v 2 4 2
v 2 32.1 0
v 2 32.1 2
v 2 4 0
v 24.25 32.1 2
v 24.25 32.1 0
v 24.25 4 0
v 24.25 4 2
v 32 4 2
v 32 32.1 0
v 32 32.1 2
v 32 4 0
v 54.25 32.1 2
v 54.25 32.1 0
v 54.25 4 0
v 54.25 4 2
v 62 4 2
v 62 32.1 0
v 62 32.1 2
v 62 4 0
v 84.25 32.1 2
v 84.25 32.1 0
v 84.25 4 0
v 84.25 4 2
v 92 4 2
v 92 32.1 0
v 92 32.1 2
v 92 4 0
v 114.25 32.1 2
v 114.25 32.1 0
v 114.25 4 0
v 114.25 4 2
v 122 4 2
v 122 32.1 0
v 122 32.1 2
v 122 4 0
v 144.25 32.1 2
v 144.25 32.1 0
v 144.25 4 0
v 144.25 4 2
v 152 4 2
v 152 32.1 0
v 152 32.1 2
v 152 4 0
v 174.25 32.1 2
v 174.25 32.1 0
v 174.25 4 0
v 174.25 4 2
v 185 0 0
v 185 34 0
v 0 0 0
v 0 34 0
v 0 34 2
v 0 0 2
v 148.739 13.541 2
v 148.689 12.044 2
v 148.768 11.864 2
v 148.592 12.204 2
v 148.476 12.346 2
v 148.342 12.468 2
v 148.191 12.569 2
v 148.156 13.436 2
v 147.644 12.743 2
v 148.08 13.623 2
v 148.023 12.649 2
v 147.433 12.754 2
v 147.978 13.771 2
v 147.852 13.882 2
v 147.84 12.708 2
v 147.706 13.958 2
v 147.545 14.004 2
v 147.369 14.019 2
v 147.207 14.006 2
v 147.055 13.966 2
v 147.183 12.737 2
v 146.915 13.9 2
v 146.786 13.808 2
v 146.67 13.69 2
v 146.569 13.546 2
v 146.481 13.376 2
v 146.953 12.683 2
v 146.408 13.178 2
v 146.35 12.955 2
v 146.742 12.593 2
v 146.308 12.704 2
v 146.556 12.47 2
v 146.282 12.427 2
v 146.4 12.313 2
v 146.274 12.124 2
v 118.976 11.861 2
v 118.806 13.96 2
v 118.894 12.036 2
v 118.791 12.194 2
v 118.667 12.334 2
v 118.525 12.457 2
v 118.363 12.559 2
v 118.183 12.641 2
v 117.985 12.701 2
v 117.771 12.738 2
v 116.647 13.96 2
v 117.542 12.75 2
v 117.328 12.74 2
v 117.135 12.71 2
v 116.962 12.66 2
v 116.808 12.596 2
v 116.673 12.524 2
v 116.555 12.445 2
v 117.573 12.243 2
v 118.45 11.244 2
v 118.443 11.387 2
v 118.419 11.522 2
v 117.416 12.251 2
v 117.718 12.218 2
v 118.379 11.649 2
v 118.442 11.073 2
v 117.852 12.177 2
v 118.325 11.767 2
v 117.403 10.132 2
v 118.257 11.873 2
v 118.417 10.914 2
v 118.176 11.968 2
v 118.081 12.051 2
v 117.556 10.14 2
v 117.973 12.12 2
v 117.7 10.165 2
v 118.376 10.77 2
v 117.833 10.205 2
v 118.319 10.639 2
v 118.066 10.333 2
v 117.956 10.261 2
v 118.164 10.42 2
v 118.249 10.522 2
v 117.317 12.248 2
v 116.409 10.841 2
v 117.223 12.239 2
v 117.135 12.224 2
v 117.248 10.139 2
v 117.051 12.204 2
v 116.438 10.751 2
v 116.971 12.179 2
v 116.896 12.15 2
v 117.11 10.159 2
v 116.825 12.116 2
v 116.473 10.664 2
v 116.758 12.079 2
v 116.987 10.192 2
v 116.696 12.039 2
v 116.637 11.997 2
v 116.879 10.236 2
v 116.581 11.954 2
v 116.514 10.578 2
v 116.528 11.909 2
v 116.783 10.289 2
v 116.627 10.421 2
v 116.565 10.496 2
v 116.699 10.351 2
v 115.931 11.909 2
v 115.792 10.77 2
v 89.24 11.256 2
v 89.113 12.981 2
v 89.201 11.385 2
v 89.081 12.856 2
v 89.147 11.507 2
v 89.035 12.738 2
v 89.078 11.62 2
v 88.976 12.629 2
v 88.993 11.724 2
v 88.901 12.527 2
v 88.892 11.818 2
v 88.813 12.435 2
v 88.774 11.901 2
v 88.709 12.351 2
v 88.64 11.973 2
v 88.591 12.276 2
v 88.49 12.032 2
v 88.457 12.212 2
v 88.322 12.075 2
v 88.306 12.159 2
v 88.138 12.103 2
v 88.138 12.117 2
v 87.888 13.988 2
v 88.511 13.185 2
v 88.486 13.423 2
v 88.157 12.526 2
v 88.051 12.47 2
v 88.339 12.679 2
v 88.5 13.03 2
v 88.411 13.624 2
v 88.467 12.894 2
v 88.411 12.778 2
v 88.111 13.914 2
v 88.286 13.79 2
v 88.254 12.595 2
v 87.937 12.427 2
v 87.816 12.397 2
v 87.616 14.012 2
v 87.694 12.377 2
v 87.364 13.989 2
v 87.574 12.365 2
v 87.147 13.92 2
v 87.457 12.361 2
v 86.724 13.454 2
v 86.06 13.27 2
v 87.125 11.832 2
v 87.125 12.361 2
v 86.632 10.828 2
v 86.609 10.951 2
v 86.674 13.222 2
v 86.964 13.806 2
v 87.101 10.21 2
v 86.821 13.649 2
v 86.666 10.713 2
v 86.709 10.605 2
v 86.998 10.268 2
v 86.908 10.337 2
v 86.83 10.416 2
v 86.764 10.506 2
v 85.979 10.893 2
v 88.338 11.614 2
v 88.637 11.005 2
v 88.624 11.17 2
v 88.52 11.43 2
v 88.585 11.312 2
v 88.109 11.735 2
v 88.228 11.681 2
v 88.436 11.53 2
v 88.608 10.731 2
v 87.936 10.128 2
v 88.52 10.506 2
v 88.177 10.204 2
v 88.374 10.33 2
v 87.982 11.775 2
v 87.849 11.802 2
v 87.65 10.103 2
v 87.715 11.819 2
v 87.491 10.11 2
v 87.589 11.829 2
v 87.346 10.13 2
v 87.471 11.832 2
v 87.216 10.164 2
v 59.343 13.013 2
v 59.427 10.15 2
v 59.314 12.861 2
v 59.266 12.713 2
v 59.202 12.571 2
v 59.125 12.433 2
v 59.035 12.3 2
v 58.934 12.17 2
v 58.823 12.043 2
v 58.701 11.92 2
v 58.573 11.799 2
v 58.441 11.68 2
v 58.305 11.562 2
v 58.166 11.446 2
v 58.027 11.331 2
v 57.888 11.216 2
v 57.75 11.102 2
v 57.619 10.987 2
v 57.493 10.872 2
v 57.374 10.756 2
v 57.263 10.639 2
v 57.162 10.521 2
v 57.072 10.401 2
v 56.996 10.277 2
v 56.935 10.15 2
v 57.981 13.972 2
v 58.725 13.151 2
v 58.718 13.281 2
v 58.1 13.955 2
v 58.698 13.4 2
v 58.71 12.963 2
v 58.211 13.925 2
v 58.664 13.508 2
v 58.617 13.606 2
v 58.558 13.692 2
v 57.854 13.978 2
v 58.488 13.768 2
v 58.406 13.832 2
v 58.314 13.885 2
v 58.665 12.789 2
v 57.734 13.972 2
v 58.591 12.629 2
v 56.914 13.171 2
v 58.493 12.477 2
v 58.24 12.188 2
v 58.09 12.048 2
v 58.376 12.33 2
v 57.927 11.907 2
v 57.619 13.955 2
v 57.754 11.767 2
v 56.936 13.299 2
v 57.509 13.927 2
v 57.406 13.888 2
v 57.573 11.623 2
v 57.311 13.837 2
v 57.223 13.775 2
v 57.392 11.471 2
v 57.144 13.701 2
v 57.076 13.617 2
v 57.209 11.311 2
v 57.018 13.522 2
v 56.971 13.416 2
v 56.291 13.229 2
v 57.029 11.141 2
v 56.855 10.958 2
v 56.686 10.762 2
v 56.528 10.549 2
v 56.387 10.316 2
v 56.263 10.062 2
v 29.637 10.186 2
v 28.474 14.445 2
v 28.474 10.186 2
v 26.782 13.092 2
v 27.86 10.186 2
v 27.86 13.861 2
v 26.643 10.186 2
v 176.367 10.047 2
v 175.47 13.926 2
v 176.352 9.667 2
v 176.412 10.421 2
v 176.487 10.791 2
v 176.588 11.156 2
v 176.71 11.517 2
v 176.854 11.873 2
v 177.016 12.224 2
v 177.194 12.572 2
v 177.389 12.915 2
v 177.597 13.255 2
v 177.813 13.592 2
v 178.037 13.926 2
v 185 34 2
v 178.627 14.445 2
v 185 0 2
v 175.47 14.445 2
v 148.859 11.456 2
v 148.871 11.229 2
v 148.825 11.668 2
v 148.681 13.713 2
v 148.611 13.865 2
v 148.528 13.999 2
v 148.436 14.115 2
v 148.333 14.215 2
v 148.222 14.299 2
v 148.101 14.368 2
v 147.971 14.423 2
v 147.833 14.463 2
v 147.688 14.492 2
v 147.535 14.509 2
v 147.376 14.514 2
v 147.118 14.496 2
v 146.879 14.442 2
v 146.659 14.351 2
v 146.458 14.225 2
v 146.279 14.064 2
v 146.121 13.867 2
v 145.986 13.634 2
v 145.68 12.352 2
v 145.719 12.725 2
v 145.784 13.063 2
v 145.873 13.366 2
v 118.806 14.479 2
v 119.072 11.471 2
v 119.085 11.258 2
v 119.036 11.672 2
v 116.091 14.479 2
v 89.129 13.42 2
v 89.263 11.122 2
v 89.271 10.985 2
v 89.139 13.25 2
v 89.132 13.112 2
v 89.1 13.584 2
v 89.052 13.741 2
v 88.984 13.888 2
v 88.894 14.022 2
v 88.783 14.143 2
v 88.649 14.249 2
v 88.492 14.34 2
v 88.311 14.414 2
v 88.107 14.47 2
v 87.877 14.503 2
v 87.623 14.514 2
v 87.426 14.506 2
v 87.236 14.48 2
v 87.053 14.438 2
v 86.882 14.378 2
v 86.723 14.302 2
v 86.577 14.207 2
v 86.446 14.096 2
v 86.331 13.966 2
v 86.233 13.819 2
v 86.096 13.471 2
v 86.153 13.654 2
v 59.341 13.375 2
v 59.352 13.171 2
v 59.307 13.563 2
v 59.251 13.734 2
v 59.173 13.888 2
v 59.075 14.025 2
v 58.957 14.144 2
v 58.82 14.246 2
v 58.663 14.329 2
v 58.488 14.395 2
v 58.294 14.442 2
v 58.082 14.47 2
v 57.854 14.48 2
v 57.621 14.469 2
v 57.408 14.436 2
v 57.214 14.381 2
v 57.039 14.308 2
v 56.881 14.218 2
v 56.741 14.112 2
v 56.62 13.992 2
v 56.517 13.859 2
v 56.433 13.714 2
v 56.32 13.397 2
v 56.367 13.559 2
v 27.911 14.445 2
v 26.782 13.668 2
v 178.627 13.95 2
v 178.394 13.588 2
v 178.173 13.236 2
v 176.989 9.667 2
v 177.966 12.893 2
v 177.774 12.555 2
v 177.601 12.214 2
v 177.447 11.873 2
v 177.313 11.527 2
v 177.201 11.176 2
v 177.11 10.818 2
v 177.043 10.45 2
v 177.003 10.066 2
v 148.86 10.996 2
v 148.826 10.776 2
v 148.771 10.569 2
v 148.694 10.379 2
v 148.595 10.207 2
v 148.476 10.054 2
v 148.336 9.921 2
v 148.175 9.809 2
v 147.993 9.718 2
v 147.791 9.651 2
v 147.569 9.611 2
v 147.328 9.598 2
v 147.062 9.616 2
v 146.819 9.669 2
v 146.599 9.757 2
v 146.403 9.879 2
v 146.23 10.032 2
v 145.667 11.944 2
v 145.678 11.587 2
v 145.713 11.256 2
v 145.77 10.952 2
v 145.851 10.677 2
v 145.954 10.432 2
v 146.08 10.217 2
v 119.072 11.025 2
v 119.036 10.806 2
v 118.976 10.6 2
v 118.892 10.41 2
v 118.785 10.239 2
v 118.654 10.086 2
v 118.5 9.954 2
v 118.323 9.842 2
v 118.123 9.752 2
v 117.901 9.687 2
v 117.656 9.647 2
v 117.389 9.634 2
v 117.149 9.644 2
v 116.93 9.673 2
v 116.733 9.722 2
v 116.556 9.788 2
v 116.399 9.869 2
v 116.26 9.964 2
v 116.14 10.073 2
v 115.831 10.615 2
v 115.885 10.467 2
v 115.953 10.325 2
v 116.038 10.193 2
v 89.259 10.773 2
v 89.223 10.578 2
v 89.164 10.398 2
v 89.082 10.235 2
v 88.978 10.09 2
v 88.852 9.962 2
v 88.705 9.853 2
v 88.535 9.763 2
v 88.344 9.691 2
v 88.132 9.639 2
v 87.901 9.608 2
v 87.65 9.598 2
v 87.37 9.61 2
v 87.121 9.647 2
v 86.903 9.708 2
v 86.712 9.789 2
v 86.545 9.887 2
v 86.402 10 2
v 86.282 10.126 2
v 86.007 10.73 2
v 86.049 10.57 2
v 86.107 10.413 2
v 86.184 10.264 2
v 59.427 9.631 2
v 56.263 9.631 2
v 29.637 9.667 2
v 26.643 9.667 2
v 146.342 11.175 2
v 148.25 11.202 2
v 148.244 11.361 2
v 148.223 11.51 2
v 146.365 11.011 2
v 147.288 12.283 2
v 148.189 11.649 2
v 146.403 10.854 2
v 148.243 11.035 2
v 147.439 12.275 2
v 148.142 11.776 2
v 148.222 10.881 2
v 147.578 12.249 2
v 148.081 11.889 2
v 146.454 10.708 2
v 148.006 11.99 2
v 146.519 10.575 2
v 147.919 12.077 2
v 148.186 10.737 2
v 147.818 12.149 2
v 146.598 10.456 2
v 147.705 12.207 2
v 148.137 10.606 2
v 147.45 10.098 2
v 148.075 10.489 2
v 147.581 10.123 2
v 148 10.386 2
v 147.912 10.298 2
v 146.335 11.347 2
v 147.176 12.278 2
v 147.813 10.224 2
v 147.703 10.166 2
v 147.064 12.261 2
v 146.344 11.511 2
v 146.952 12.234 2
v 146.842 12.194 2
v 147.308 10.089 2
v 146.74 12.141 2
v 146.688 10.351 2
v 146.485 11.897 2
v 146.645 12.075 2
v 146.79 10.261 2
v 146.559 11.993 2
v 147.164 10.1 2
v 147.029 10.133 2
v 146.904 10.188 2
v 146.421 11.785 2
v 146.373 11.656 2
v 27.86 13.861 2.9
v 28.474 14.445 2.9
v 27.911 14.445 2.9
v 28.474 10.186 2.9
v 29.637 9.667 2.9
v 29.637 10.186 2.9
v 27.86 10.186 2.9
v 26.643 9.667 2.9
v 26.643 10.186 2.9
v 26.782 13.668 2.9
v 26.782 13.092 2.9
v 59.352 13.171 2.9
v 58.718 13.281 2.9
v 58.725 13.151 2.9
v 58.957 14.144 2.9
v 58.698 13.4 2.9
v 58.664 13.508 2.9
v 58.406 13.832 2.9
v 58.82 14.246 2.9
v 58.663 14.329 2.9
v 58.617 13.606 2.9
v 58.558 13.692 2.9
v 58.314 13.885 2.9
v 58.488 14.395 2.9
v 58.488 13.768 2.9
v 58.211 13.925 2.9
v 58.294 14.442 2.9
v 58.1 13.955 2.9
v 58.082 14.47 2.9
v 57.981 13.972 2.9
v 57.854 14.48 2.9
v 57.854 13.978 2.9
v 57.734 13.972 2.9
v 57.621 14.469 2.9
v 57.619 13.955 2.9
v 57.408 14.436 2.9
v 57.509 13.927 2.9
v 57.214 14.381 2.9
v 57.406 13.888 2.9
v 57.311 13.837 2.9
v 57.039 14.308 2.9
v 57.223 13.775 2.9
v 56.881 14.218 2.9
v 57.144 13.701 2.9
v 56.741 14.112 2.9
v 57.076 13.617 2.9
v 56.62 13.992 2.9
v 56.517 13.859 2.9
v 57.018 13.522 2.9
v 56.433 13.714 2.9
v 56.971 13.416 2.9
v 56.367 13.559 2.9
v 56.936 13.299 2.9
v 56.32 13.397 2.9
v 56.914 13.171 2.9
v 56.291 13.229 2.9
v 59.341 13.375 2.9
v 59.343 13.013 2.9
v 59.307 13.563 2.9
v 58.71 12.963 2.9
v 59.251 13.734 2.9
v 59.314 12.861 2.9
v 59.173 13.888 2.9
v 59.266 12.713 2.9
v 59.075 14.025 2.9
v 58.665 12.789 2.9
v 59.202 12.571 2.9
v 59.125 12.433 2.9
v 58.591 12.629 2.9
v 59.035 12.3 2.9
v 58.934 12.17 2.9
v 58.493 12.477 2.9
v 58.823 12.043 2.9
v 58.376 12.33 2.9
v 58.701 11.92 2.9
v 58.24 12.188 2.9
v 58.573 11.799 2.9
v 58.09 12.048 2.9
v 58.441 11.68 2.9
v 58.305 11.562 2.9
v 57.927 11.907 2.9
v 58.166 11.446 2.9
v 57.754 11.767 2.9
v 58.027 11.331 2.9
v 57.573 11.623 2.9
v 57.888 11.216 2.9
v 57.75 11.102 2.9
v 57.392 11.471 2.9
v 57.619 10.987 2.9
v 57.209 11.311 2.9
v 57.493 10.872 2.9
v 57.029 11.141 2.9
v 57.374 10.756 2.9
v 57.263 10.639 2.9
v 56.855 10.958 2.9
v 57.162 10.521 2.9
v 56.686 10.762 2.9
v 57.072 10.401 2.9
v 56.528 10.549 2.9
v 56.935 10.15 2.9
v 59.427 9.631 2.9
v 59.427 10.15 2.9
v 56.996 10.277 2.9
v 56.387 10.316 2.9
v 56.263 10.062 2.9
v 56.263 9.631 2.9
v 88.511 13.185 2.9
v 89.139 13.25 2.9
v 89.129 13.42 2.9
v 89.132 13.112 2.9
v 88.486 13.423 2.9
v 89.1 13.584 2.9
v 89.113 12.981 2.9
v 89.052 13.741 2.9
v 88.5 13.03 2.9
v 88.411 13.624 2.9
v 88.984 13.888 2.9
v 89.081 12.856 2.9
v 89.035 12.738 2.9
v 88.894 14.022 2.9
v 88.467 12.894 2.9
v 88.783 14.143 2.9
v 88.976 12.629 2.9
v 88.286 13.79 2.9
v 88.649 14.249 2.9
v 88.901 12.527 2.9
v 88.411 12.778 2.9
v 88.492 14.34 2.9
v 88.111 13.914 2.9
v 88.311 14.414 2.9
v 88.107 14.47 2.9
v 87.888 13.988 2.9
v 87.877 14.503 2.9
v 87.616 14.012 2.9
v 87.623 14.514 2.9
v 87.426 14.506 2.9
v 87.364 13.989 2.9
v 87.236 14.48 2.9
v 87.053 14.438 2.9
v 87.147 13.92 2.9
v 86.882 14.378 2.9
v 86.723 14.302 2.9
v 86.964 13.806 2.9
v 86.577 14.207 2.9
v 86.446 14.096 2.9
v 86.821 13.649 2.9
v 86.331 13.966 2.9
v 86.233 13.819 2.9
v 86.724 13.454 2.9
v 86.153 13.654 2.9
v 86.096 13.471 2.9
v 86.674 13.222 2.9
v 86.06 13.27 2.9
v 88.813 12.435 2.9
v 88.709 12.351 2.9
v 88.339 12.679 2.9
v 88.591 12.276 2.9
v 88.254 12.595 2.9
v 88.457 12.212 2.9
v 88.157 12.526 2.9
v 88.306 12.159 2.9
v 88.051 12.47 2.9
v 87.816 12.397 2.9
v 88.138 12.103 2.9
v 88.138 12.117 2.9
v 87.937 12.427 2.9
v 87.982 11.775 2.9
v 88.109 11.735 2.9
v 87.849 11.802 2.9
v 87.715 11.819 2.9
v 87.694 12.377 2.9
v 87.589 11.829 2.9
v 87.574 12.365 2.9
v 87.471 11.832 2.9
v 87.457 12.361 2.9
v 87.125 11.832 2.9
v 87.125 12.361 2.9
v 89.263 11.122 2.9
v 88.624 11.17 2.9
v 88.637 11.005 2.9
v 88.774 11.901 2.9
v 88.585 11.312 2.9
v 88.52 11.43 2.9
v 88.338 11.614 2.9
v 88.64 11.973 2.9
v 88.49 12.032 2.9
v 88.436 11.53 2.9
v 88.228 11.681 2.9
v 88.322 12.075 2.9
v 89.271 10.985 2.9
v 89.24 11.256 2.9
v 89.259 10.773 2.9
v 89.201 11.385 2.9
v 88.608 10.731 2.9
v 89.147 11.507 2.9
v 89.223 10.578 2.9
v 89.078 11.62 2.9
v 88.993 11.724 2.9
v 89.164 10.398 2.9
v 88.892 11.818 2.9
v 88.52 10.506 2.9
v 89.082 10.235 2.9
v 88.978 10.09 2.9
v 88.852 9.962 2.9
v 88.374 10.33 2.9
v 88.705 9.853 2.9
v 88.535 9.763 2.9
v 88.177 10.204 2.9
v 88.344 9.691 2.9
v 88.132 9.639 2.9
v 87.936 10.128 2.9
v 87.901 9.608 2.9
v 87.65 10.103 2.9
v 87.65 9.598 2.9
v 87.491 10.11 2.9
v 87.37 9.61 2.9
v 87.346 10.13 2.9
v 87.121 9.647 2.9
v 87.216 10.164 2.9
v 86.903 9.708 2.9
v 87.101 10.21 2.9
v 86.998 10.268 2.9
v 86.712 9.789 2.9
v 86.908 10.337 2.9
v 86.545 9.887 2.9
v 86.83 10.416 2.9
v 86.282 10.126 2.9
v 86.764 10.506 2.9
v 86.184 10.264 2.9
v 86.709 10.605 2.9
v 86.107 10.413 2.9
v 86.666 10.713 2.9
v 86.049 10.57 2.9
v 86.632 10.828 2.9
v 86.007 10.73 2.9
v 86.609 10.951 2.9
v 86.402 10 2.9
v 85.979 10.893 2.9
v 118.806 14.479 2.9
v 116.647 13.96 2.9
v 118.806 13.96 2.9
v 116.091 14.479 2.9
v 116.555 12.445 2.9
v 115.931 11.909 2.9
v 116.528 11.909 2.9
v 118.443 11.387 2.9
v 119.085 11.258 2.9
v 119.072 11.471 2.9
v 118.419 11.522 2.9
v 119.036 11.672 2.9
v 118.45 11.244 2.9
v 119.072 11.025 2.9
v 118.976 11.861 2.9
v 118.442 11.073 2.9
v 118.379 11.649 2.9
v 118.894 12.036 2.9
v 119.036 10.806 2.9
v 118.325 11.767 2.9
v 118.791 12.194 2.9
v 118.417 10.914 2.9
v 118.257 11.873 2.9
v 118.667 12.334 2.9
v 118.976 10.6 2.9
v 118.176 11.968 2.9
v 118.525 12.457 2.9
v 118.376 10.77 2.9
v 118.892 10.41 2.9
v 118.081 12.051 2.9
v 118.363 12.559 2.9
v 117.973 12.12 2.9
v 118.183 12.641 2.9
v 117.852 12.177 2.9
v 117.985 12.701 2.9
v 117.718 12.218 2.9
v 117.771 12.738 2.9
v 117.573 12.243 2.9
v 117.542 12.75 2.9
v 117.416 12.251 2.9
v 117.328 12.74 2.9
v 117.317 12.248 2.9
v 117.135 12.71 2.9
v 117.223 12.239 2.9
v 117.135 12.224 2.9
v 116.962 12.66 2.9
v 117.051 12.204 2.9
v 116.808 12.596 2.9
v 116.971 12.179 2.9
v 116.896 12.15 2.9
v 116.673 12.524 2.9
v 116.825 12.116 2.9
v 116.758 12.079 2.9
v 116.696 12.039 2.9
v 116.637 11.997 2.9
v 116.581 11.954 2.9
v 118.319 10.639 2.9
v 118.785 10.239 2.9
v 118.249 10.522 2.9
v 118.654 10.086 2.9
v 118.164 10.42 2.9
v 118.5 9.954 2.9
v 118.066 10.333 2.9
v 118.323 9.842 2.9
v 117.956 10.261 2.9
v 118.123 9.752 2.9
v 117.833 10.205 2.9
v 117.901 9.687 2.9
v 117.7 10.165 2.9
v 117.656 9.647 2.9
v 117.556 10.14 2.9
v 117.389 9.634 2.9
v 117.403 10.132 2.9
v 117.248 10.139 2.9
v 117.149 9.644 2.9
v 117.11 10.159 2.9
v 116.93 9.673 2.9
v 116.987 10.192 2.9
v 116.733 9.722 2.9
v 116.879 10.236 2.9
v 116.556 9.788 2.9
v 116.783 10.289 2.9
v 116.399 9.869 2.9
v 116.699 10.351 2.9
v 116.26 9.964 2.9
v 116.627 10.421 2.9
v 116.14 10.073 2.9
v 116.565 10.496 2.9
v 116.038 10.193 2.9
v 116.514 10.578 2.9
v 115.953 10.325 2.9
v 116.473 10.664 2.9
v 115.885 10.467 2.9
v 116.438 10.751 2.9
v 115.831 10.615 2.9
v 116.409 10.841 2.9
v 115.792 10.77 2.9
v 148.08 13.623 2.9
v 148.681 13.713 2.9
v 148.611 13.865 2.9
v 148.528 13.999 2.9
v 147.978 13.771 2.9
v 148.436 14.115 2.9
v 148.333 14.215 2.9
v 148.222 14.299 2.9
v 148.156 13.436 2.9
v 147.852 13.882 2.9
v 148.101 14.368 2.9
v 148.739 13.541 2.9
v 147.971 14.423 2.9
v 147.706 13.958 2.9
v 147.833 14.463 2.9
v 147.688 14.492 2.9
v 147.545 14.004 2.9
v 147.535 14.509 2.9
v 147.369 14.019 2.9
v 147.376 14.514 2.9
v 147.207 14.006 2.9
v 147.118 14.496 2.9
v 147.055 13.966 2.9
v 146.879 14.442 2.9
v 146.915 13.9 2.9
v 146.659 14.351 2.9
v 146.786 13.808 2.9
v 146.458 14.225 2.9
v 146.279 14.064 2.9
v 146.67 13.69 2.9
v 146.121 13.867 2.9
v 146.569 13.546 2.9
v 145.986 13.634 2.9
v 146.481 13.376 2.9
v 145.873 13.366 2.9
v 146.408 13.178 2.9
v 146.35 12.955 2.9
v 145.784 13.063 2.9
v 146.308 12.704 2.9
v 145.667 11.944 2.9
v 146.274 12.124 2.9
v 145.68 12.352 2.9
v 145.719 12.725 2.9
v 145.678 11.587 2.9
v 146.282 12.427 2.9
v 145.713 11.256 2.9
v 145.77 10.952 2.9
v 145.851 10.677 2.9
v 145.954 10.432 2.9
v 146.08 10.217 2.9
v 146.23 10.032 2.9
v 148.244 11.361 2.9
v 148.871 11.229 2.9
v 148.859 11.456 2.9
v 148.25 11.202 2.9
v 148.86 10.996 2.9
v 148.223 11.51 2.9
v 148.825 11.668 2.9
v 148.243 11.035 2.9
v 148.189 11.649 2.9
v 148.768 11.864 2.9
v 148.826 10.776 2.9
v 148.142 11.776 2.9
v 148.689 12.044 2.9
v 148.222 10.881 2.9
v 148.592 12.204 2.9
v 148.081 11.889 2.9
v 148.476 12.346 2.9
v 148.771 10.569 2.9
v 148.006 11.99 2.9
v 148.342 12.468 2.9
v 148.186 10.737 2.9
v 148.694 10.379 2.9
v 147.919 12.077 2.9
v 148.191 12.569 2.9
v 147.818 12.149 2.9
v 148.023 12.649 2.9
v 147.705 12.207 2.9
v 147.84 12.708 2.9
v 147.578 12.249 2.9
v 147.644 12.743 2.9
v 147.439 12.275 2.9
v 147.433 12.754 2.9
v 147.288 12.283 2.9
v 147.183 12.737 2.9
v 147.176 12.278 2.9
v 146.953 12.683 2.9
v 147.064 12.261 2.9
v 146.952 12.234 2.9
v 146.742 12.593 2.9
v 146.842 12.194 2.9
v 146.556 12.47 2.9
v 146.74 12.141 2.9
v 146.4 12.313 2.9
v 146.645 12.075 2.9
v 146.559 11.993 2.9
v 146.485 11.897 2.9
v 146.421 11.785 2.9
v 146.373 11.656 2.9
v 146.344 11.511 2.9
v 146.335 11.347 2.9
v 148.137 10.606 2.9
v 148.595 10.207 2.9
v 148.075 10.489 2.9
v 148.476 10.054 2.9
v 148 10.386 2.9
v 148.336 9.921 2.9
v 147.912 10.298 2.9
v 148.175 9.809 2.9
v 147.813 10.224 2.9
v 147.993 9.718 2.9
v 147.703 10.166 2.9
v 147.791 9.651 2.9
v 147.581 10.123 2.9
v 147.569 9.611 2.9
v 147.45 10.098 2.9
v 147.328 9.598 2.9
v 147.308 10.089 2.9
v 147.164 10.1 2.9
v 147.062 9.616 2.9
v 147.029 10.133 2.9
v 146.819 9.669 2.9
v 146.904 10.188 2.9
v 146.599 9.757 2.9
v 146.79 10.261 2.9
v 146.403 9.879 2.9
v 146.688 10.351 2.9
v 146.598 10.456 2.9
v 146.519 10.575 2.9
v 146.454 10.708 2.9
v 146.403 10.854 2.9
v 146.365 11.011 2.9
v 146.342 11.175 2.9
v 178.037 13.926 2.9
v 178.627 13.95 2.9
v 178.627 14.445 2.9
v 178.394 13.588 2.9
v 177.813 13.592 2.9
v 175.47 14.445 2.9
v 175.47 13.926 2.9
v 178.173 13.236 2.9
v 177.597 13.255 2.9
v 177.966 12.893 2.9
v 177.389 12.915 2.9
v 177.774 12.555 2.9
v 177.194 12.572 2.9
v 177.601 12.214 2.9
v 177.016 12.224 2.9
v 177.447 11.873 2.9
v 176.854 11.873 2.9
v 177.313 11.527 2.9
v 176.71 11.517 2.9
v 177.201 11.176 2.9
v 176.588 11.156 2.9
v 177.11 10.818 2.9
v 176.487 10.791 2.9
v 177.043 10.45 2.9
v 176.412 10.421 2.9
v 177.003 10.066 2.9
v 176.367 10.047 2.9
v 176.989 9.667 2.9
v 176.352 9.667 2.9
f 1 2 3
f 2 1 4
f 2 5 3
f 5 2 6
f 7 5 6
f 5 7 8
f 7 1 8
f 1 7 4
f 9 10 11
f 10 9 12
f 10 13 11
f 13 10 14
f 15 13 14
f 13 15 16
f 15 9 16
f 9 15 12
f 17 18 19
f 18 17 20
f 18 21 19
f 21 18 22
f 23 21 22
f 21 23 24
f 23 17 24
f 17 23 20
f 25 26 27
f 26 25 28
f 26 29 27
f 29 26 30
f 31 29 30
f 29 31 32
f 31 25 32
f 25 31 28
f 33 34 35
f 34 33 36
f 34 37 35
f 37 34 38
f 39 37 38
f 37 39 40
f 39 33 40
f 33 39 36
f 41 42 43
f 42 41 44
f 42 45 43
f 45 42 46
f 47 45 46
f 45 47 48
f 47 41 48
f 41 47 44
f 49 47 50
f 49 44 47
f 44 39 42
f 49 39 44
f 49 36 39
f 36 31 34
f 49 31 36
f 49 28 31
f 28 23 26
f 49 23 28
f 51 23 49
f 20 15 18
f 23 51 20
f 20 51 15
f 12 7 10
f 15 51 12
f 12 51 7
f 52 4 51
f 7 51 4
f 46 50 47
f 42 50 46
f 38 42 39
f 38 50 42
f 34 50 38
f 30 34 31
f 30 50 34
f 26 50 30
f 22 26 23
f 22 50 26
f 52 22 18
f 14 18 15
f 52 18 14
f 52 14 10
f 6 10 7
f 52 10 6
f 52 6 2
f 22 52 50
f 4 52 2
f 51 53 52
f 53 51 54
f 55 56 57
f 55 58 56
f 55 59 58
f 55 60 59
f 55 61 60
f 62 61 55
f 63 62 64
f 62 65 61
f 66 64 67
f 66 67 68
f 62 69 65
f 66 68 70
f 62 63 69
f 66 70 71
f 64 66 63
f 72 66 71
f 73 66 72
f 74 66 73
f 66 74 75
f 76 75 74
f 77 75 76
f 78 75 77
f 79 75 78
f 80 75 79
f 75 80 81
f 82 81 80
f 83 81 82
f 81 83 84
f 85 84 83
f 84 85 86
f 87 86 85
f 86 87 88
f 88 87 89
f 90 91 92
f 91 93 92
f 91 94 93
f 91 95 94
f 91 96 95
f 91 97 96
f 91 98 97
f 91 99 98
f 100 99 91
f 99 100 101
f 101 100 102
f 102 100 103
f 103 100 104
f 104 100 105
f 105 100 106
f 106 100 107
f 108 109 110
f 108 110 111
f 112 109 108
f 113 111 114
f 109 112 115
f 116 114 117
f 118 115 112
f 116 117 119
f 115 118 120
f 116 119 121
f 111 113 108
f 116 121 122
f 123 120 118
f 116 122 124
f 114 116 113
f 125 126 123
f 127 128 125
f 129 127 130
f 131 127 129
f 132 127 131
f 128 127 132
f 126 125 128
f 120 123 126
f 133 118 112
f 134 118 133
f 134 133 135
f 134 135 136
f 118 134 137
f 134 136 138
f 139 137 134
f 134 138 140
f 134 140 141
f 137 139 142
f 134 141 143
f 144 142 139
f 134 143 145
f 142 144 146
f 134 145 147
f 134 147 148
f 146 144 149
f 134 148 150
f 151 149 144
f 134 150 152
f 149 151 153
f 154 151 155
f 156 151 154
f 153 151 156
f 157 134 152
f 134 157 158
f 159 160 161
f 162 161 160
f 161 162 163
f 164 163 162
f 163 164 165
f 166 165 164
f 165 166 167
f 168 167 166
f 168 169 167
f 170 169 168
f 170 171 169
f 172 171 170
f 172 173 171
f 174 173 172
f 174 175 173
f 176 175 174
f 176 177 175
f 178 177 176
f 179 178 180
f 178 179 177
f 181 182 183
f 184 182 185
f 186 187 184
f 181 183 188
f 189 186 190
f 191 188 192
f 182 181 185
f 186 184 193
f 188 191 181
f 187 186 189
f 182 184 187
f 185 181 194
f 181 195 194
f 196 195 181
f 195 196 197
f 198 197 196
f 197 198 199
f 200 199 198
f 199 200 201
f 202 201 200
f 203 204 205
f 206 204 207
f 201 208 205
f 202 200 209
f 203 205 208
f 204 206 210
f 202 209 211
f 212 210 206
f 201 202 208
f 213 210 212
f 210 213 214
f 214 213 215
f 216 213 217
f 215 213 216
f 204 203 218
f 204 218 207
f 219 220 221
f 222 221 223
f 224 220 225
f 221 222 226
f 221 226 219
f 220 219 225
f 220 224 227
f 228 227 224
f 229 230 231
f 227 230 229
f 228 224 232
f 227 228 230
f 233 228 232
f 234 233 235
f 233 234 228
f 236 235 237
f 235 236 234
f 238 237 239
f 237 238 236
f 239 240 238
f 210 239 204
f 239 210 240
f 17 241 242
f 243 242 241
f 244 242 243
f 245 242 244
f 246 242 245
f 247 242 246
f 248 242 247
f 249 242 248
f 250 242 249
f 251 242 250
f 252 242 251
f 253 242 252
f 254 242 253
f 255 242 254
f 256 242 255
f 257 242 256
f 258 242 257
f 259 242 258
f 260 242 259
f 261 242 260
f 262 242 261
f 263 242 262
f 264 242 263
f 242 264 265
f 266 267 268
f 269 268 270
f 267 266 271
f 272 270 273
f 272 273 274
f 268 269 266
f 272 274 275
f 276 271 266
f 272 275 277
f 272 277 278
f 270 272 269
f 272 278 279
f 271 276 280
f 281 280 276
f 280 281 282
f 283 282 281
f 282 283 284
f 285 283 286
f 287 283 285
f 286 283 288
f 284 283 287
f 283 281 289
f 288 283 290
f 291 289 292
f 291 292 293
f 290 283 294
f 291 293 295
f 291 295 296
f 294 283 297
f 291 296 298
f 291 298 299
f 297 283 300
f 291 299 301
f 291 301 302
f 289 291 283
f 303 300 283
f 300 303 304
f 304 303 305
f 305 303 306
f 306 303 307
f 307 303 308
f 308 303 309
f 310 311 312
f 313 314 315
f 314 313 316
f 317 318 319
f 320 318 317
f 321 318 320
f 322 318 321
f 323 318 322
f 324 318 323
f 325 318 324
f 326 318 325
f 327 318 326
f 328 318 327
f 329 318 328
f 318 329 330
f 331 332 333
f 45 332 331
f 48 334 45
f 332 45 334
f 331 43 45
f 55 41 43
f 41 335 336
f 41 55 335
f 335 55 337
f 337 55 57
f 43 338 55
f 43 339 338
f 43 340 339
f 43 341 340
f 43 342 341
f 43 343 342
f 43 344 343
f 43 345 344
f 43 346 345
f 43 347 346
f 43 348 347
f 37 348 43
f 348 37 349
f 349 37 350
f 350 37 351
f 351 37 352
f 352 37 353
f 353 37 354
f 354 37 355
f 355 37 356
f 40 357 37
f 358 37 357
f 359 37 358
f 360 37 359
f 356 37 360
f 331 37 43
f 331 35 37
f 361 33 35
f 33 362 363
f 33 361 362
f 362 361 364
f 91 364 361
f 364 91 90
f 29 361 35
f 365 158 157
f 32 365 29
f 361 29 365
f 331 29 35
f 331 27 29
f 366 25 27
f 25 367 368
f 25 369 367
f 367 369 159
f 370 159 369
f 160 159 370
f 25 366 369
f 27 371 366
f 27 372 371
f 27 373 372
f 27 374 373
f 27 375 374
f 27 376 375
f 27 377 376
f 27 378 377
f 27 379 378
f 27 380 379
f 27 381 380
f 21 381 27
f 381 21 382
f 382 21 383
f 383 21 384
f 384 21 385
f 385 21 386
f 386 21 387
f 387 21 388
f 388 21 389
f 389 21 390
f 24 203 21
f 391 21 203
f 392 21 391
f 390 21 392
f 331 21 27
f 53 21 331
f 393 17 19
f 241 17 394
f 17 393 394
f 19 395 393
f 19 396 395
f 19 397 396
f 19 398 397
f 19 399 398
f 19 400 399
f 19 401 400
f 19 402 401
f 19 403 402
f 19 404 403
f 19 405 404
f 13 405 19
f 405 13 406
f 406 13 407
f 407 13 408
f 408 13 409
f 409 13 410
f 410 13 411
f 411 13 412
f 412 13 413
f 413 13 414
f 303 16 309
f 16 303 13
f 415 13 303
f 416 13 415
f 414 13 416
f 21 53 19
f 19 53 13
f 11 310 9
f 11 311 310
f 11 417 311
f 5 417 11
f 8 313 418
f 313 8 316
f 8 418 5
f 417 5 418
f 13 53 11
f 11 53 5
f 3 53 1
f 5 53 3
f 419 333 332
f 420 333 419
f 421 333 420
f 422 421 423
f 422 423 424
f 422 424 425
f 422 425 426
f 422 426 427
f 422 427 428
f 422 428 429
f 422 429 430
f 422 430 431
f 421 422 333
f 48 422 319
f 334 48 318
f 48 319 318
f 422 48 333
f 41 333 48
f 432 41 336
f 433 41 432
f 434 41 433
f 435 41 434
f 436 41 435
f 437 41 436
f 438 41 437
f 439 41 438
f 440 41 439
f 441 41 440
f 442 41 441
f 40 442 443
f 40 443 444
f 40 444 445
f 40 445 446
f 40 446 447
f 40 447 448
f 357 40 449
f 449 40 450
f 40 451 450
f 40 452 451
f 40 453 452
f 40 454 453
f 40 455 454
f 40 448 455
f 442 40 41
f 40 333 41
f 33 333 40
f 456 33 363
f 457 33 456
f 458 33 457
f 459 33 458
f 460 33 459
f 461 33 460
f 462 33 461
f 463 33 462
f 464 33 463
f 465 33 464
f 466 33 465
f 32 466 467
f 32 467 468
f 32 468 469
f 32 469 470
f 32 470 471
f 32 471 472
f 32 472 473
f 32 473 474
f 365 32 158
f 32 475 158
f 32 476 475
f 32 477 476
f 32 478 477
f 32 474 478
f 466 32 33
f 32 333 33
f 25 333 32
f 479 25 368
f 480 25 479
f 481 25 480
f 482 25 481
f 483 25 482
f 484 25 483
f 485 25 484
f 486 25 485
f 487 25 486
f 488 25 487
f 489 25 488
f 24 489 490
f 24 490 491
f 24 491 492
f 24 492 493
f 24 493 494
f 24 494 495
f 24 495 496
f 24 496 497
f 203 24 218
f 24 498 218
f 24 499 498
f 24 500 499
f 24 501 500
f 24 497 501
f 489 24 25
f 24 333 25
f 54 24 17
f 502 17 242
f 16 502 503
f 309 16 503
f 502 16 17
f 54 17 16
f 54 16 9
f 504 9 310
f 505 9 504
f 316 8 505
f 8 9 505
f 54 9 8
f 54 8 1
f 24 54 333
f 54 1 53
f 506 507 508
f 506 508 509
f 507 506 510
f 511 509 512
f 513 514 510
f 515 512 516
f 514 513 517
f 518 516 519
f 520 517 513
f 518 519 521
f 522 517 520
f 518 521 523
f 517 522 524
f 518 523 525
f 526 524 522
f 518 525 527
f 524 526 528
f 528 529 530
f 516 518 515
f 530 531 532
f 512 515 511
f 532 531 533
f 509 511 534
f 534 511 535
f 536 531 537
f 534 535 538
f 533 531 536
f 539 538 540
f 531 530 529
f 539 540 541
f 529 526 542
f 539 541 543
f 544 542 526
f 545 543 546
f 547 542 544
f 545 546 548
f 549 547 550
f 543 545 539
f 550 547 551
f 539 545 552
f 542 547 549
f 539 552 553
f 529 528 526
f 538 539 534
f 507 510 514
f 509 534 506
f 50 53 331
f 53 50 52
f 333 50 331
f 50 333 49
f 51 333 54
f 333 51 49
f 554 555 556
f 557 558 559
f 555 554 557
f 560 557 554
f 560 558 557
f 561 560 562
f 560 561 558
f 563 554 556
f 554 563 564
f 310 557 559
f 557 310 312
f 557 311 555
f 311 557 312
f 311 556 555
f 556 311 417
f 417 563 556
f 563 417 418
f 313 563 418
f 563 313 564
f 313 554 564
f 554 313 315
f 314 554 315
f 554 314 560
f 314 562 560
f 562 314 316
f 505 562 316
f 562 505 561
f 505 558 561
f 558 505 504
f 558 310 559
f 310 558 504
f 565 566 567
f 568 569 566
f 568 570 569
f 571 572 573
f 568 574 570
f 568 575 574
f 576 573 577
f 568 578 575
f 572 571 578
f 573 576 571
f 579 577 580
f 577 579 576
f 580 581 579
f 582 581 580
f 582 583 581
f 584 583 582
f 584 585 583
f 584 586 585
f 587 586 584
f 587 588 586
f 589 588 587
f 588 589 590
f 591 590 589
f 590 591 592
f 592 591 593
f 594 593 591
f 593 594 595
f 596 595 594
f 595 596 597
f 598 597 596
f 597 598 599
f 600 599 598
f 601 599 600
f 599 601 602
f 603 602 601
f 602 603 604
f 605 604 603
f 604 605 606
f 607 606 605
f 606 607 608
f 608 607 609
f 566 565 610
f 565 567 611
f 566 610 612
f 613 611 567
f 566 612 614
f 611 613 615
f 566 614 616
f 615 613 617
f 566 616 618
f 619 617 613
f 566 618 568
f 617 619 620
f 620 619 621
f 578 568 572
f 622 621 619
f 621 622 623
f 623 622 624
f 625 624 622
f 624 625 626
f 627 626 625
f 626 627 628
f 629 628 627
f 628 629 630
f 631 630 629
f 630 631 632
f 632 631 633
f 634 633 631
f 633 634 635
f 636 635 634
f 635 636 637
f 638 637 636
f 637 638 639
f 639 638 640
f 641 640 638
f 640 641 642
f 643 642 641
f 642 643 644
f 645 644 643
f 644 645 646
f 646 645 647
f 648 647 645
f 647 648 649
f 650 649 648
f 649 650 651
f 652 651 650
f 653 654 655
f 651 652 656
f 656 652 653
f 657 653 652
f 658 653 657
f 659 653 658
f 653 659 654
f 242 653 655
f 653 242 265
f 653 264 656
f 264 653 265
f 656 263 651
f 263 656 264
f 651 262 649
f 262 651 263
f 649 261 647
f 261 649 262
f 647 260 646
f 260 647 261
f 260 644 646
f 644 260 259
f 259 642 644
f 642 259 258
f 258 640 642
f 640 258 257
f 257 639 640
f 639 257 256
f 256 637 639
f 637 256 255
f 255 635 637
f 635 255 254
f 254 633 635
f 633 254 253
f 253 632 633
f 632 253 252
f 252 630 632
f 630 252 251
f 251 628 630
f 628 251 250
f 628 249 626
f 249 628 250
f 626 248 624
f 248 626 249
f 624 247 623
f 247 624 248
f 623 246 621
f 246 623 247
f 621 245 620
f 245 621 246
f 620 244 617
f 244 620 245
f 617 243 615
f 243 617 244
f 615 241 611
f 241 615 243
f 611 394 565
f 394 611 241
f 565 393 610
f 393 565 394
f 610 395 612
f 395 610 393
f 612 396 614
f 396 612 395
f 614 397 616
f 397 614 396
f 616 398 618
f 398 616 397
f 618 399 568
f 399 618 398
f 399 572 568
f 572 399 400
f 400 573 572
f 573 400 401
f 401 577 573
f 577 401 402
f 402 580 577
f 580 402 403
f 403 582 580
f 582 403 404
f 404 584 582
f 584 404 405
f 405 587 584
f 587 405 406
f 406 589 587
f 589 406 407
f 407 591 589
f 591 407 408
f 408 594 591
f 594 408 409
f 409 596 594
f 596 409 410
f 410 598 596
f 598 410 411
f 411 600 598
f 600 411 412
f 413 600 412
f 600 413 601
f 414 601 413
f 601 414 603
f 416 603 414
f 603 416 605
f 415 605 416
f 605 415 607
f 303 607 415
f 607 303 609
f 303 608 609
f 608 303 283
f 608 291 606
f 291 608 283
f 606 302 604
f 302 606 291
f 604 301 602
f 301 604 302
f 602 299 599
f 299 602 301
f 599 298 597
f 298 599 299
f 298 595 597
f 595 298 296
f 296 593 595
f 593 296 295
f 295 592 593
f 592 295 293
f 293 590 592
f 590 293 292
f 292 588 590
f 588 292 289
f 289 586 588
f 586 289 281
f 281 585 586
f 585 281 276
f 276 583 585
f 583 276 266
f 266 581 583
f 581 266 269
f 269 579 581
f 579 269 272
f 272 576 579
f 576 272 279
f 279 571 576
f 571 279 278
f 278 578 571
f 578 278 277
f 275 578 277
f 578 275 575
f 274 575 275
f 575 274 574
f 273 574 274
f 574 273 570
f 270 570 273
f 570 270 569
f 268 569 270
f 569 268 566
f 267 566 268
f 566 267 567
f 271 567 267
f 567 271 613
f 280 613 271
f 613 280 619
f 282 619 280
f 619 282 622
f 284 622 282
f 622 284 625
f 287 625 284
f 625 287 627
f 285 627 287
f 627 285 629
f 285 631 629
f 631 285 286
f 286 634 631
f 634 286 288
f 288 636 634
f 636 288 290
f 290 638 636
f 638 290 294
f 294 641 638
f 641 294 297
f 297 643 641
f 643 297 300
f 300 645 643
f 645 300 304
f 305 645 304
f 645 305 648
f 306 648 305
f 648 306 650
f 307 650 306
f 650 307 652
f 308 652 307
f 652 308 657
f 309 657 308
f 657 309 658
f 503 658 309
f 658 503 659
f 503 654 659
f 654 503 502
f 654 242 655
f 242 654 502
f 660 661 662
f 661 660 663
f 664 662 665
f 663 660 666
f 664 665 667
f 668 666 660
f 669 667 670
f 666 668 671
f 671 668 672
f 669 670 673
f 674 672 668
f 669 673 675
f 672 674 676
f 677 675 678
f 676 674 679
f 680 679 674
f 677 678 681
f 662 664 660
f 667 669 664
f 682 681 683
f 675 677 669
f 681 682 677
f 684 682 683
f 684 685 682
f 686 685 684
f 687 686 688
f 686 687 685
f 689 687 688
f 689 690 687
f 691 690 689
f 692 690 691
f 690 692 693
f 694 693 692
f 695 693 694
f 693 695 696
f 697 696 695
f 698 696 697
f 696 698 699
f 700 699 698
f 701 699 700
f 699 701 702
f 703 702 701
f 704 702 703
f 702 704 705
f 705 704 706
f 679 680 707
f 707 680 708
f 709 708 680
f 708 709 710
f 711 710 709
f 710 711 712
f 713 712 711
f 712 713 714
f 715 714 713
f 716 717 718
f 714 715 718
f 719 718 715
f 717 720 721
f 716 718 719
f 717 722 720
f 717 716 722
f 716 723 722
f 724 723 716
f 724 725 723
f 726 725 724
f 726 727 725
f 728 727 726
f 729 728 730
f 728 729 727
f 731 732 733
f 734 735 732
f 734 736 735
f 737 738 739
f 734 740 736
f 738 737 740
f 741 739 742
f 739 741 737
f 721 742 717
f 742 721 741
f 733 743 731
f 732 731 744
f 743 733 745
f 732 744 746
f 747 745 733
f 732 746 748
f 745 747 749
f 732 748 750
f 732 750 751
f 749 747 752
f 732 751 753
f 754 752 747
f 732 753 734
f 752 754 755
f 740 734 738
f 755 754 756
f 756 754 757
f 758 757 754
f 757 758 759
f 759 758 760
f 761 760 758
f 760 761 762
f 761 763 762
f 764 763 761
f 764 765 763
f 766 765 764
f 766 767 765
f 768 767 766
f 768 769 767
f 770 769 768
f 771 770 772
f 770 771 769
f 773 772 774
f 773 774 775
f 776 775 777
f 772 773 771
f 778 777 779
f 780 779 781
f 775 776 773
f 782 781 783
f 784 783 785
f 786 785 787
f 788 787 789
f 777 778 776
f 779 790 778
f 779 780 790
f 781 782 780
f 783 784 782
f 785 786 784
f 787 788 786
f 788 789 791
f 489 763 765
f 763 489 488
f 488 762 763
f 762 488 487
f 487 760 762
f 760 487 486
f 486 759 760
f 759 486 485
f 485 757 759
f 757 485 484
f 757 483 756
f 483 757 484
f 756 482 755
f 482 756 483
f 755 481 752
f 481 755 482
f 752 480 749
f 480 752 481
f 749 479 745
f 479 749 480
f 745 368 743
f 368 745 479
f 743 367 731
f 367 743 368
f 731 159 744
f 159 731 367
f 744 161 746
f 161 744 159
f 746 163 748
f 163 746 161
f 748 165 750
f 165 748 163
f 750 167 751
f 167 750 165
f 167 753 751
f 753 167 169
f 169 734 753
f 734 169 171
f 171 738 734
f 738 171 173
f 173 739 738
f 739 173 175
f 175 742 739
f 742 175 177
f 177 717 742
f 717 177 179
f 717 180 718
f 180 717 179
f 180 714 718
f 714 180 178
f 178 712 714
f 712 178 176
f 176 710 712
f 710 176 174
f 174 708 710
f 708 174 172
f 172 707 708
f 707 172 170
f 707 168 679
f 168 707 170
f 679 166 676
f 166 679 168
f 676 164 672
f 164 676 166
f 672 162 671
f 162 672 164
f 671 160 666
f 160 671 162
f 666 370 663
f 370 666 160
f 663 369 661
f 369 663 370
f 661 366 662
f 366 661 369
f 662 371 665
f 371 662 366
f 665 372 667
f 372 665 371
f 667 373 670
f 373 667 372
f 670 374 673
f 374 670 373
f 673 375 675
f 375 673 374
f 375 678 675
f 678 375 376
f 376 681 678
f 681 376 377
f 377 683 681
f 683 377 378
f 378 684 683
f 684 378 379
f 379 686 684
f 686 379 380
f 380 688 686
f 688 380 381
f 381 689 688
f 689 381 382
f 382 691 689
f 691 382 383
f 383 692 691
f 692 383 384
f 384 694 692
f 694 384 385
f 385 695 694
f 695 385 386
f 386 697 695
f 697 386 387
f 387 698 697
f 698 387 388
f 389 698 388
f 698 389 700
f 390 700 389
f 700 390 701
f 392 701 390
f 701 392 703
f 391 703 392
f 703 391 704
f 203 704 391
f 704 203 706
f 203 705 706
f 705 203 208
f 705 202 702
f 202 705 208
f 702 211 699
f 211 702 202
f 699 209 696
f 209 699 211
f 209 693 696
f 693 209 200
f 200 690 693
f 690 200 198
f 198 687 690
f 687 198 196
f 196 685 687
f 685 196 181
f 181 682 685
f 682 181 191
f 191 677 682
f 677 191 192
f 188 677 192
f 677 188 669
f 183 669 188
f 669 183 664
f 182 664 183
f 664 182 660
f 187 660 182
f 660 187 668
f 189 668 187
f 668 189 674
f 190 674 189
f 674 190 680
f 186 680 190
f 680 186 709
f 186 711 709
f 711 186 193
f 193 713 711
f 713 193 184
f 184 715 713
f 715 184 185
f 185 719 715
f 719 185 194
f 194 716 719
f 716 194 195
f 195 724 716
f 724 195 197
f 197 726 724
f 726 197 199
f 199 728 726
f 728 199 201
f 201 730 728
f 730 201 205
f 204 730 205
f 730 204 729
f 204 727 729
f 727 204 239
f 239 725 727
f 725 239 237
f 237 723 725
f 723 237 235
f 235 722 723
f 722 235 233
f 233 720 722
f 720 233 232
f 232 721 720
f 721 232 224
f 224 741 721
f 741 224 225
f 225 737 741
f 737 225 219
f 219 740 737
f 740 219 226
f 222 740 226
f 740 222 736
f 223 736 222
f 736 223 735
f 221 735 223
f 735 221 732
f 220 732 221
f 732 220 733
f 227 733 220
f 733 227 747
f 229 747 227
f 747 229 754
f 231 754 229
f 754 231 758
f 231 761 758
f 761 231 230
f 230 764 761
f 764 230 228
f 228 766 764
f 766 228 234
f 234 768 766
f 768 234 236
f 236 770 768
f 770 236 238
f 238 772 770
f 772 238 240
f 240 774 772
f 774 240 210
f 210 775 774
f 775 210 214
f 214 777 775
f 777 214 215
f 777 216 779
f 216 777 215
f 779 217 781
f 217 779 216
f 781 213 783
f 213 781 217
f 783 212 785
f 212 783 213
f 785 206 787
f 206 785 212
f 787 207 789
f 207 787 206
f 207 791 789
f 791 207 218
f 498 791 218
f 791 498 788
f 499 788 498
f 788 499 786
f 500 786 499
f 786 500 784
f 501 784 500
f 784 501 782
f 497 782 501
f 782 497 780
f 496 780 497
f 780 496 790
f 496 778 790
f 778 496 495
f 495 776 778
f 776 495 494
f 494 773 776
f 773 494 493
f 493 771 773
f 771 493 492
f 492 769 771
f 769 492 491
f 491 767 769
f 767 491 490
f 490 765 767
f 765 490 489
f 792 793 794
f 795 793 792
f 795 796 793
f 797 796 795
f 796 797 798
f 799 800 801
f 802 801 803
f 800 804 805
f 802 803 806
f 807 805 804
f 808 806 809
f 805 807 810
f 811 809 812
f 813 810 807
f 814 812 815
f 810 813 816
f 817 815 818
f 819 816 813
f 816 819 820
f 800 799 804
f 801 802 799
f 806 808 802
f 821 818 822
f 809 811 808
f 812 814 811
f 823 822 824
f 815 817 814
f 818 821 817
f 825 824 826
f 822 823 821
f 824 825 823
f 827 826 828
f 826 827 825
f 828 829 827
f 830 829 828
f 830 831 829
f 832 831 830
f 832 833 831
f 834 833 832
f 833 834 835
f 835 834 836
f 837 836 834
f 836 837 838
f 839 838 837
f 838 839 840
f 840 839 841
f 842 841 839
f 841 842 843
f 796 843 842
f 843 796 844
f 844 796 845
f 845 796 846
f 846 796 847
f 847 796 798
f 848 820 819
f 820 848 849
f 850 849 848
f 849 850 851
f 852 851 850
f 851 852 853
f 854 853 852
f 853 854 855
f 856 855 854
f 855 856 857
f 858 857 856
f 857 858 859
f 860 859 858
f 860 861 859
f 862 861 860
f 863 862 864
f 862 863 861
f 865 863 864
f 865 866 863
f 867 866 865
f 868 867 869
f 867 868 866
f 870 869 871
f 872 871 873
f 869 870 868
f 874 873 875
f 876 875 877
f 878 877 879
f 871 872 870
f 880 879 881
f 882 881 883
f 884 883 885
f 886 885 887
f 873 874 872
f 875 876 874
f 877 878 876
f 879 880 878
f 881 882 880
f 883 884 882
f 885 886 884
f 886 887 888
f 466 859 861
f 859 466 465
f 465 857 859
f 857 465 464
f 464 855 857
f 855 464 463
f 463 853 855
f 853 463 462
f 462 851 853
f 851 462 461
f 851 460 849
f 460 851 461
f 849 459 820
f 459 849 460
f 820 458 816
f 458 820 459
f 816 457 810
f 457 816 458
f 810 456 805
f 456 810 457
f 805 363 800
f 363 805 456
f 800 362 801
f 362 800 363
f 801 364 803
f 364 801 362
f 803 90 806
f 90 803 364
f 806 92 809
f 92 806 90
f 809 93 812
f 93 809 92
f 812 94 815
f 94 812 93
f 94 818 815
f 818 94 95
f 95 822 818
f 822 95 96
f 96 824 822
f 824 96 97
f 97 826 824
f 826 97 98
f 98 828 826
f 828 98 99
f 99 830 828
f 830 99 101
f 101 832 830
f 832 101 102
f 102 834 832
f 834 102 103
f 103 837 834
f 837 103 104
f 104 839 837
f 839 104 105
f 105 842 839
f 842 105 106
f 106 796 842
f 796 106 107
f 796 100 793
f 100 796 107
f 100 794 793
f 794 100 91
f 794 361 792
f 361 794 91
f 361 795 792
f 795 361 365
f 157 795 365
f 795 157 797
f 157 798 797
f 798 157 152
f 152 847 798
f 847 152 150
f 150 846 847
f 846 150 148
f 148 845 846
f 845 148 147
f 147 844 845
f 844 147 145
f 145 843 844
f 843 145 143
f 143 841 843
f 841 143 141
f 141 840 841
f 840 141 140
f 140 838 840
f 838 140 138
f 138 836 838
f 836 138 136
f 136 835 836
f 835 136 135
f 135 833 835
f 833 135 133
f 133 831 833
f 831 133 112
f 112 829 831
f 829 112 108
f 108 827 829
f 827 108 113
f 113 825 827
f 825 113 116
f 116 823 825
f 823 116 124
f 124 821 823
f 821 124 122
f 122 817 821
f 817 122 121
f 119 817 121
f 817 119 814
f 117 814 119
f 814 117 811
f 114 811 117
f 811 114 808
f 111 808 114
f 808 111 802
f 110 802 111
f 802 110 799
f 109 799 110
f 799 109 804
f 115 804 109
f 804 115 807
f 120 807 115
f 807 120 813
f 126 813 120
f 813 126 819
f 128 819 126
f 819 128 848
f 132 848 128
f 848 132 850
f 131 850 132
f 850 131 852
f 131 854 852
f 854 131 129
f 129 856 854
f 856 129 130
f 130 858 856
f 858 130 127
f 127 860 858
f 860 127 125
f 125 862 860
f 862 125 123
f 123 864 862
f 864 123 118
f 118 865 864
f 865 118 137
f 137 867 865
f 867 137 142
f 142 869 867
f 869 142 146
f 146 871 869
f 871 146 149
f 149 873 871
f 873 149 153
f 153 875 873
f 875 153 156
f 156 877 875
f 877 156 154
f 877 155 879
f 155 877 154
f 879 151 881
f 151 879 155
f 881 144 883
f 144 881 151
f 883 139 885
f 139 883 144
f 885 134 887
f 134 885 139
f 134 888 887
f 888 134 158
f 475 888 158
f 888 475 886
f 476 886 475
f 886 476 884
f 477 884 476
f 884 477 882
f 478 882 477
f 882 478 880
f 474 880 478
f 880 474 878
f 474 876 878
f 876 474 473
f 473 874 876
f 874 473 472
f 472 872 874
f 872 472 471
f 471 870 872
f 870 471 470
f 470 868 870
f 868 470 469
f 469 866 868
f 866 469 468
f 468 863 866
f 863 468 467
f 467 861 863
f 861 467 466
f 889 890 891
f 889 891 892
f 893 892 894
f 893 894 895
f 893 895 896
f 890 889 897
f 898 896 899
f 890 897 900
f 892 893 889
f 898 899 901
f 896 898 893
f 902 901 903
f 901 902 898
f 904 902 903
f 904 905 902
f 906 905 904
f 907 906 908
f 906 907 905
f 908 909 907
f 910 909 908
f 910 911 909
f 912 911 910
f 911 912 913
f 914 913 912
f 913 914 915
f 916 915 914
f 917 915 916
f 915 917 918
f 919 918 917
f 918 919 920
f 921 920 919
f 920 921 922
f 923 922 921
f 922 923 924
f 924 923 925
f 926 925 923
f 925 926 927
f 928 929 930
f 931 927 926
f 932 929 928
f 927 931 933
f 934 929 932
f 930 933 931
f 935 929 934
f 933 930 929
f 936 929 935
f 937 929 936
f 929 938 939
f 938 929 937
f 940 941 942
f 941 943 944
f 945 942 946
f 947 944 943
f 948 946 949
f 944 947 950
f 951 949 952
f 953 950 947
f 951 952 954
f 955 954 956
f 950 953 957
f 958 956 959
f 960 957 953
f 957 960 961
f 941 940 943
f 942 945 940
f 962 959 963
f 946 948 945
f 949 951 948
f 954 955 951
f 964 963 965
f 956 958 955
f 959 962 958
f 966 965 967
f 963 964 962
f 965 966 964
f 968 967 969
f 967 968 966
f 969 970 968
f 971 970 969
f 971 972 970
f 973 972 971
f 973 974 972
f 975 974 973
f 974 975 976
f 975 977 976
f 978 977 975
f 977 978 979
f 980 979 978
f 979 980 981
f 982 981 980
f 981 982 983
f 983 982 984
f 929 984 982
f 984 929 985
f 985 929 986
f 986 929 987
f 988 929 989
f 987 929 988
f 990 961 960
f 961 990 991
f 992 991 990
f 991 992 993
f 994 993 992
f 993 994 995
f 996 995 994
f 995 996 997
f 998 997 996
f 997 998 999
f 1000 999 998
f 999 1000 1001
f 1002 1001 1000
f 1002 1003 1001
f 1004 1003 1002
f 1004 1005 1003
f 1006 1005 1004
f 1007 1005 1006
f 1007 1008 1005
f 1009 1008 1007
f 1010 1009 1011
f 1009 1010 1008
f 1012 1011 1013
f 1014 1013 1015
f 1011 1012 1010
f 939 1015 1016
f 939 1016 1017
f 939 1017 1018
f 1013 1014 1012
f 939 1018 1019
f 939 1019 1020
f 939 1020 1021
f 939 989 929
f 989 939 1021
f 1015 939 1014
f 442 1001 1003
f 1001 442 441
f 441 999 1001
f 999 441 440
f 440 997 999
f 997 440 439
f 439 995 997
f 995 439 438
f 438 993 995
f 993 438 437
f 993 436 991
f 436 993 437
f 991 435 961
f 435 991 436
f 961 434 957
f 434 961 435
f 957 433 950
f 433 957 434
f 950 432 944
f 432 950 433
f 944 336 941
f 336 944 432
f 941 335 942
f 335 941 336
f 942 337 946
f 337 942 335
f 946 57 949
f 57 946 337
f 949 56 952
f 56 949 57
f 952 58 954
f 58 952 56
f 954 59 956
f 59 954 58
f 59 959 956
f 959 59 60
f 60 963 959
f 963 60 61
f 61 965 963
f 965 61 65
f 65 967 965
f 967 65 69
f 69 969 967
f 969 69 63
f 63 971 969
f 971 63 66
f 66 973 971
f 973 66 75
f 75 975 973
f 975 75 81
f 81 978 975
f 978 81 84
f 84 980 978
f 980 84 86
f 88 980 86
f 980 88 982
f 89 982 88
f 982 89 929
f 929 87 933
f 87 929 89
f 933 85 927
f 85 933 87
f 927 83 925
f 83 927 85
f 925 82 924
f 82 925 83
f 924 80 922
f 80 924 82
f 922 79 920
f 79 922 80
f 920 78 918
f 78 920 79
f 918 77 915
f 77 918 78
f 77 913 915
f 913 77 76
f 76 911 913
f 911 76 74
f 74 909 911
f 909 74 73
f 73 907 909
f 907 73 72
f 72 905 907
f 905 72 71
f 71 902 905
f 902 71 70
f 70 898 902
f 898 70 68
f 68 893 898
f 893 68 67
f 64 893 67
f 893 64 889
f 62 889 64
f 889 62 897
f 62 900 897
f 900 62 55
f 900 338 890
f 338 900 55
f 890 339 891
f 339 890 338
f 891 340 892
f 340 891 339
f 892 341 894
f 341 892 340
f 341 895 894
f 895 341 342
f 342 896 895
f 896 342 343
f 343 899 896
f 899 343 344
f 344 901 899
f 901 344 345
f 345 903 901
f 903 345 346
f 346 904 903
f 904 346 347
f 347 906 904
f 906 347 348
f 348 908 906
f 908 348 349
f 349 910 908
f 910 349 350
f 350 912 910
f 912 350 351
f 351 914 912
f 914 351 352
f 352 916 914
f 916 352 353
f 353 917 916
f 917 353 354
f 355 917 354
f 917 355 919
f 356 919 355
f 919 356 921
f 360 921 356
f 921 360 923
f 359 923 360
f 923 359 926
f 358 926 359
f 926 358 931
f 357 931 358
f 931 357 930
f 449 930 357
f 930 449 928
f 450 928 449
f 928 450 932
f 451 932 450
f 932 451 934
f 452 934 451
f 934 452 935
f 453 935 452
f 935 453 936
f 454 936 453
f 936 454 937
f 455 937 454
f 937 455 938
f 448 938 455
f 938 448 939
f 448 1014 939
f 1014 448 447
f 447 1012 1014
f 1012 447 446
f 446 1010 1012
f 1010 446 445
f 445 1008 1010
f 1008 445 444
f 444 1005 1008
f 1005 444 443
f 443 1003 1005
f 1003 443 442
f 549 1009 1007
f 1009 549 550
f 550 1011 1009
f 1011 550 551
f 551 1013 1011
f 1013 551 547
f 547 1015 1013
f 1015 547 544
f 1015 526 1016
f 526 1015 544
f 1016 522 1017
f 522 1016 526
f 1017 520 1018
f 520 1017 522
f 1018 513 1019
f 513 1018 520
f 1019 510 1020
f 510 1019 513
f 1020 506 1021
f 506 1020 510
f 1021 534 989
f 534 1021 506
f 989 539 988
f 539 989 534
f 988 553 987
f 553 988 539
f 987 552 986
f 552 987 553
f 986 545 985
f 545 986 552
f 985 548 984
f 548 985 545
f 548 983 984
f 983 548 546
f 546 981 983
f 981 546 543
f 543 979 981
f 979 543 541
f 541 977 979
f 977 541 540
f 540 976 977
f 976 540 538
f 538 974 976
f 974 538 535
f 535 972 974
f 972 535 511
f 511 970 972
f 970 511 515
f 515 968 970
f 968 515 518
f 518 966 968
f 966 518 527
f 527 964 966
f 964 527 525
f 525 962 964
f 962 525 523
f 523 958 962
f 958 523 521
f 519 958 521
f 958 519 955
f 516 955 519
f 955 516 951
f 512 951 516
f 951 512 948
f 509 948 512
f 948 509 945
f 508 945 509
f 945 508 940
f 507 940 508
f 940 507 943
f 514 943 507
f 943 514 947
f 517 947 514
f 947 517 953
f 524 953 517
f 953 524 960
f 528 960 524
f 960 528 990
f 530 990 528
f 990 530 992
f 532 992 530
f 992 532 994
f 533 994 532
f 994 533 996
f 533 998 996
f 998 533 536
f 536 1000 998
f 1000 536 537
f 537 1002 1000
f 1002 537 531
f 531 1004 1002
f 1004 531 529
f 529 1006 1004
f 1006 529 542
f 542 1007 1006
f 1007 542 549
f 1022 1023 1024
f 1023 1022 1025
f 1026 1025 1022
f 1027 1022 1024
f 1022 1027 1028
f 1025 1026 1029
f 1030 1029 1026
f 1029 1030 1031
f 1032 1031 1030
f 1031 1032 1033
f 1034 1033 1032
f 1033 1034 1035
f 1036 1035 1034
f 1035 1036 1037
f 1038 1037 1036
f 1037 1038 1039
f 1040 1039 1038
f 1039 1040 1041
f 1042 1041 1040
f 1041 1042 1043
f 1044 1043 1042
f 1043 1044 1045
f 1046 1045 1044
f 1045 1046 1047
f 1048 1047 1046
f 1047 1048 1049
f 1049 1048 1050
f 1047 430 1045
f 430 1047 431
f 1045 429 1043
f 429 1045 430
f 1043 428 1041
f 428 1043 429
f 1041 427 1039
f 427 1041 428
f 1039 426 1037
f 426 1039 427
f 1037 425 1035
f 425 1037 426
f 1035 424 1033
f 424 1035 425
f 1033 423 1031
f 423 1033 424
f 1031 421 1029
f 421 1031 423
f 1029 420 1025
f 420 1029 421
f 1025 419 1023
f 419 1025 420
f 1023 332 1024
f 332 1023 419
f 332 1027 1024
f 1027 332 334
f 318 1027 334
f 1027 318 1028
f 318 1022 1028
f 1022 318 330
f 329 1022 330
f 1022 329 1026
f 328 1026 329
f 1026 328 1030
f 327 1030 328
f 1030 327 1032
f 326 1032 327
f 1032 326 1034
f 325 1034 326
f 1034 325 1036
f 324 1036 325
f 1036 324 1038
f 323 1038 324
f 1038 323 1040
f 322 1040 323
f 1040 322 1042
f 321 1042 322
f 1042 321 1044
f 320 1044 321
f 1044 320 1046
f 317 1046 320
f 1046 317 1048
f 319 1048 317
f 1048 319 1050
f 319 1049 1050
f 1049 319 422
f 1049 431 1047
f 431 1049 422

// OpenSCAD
// file: button_hole.scad
include <constants.scad>

module button_hole(hole_x_offset, hole_y_offset){  
  BUTTON_HOLE_X = 22;
  BUTTON_HOLE_Y = 28;
  BUTTON_HOLE_OFFSET_X = 0.25;
  BUTTON_HOLE_OFFSET_Y = 0.1;  

  translate([0,0,-0.5])
  linear_extrude(BOX_LID_Z + 1){
    square([BUTTON_HOLE_X + BUTTON_HOLE_OFFSET_X, BUTTON_HOLE_Y + BUTTON_HOLE_OFFSET_Y]);
  }
}
// file: constants.scad
// BOX_LID_Z = 0.5;
BOX_LID_Z = 2;
BOX_LID_X = 91.44;
BOX_LID_Y = 53.34;
BOX_LID_X_Y_OFFSET = 2;
BUTTON_HOLE_X = 22;
BUTTON_HOLE_Y = 28;
BOX_WALLS_Z = 30;
BOX_LEGS_Z = 30;
BOX_LEGS_CONNECTORS_Z = 2;
// main file
include <constants.scad>
include <button_hole.scad>

module main(){
  parts = [
	   [[0.05,0.05] ,  "1"],
	   [[0.1, 0.1],    "2"],
	   [[0.15,0.15],   "3"],
	   [[-0.5,-0.5],   "5"],
	   [[-0.1,-0.1],   "6"],
	   [[-0.15,-0.15], "7"]    
  ];
  
  // Iterate over each item in parts list

  difference(){
    box_lid();

    for (i = [0 : len(parts) - 1]) {
      translate([2+30*i,4,0]){
	button_hole(parts[i][0][0], parts[i][0][1]);
      }
    }
  }

  for (i = [0 : len(parts) - 1]) {
    translate([28+i*29.8,12,BOX_LID_Z-0.1]){
      linear_extrude(1){
      text(parts[i][1], size = 5, valign = "center", halign = "center"); // adjust size as needed
      }
    }
  }
  
}

module box_lid(){
  BOX_LID_X = 185;
  BOX_LID_Y = 34;

  linear_extrude(BOX_LID_Z){
    square([BOX_LID_X, BOX_LID_Y]);
  }
}

main();
